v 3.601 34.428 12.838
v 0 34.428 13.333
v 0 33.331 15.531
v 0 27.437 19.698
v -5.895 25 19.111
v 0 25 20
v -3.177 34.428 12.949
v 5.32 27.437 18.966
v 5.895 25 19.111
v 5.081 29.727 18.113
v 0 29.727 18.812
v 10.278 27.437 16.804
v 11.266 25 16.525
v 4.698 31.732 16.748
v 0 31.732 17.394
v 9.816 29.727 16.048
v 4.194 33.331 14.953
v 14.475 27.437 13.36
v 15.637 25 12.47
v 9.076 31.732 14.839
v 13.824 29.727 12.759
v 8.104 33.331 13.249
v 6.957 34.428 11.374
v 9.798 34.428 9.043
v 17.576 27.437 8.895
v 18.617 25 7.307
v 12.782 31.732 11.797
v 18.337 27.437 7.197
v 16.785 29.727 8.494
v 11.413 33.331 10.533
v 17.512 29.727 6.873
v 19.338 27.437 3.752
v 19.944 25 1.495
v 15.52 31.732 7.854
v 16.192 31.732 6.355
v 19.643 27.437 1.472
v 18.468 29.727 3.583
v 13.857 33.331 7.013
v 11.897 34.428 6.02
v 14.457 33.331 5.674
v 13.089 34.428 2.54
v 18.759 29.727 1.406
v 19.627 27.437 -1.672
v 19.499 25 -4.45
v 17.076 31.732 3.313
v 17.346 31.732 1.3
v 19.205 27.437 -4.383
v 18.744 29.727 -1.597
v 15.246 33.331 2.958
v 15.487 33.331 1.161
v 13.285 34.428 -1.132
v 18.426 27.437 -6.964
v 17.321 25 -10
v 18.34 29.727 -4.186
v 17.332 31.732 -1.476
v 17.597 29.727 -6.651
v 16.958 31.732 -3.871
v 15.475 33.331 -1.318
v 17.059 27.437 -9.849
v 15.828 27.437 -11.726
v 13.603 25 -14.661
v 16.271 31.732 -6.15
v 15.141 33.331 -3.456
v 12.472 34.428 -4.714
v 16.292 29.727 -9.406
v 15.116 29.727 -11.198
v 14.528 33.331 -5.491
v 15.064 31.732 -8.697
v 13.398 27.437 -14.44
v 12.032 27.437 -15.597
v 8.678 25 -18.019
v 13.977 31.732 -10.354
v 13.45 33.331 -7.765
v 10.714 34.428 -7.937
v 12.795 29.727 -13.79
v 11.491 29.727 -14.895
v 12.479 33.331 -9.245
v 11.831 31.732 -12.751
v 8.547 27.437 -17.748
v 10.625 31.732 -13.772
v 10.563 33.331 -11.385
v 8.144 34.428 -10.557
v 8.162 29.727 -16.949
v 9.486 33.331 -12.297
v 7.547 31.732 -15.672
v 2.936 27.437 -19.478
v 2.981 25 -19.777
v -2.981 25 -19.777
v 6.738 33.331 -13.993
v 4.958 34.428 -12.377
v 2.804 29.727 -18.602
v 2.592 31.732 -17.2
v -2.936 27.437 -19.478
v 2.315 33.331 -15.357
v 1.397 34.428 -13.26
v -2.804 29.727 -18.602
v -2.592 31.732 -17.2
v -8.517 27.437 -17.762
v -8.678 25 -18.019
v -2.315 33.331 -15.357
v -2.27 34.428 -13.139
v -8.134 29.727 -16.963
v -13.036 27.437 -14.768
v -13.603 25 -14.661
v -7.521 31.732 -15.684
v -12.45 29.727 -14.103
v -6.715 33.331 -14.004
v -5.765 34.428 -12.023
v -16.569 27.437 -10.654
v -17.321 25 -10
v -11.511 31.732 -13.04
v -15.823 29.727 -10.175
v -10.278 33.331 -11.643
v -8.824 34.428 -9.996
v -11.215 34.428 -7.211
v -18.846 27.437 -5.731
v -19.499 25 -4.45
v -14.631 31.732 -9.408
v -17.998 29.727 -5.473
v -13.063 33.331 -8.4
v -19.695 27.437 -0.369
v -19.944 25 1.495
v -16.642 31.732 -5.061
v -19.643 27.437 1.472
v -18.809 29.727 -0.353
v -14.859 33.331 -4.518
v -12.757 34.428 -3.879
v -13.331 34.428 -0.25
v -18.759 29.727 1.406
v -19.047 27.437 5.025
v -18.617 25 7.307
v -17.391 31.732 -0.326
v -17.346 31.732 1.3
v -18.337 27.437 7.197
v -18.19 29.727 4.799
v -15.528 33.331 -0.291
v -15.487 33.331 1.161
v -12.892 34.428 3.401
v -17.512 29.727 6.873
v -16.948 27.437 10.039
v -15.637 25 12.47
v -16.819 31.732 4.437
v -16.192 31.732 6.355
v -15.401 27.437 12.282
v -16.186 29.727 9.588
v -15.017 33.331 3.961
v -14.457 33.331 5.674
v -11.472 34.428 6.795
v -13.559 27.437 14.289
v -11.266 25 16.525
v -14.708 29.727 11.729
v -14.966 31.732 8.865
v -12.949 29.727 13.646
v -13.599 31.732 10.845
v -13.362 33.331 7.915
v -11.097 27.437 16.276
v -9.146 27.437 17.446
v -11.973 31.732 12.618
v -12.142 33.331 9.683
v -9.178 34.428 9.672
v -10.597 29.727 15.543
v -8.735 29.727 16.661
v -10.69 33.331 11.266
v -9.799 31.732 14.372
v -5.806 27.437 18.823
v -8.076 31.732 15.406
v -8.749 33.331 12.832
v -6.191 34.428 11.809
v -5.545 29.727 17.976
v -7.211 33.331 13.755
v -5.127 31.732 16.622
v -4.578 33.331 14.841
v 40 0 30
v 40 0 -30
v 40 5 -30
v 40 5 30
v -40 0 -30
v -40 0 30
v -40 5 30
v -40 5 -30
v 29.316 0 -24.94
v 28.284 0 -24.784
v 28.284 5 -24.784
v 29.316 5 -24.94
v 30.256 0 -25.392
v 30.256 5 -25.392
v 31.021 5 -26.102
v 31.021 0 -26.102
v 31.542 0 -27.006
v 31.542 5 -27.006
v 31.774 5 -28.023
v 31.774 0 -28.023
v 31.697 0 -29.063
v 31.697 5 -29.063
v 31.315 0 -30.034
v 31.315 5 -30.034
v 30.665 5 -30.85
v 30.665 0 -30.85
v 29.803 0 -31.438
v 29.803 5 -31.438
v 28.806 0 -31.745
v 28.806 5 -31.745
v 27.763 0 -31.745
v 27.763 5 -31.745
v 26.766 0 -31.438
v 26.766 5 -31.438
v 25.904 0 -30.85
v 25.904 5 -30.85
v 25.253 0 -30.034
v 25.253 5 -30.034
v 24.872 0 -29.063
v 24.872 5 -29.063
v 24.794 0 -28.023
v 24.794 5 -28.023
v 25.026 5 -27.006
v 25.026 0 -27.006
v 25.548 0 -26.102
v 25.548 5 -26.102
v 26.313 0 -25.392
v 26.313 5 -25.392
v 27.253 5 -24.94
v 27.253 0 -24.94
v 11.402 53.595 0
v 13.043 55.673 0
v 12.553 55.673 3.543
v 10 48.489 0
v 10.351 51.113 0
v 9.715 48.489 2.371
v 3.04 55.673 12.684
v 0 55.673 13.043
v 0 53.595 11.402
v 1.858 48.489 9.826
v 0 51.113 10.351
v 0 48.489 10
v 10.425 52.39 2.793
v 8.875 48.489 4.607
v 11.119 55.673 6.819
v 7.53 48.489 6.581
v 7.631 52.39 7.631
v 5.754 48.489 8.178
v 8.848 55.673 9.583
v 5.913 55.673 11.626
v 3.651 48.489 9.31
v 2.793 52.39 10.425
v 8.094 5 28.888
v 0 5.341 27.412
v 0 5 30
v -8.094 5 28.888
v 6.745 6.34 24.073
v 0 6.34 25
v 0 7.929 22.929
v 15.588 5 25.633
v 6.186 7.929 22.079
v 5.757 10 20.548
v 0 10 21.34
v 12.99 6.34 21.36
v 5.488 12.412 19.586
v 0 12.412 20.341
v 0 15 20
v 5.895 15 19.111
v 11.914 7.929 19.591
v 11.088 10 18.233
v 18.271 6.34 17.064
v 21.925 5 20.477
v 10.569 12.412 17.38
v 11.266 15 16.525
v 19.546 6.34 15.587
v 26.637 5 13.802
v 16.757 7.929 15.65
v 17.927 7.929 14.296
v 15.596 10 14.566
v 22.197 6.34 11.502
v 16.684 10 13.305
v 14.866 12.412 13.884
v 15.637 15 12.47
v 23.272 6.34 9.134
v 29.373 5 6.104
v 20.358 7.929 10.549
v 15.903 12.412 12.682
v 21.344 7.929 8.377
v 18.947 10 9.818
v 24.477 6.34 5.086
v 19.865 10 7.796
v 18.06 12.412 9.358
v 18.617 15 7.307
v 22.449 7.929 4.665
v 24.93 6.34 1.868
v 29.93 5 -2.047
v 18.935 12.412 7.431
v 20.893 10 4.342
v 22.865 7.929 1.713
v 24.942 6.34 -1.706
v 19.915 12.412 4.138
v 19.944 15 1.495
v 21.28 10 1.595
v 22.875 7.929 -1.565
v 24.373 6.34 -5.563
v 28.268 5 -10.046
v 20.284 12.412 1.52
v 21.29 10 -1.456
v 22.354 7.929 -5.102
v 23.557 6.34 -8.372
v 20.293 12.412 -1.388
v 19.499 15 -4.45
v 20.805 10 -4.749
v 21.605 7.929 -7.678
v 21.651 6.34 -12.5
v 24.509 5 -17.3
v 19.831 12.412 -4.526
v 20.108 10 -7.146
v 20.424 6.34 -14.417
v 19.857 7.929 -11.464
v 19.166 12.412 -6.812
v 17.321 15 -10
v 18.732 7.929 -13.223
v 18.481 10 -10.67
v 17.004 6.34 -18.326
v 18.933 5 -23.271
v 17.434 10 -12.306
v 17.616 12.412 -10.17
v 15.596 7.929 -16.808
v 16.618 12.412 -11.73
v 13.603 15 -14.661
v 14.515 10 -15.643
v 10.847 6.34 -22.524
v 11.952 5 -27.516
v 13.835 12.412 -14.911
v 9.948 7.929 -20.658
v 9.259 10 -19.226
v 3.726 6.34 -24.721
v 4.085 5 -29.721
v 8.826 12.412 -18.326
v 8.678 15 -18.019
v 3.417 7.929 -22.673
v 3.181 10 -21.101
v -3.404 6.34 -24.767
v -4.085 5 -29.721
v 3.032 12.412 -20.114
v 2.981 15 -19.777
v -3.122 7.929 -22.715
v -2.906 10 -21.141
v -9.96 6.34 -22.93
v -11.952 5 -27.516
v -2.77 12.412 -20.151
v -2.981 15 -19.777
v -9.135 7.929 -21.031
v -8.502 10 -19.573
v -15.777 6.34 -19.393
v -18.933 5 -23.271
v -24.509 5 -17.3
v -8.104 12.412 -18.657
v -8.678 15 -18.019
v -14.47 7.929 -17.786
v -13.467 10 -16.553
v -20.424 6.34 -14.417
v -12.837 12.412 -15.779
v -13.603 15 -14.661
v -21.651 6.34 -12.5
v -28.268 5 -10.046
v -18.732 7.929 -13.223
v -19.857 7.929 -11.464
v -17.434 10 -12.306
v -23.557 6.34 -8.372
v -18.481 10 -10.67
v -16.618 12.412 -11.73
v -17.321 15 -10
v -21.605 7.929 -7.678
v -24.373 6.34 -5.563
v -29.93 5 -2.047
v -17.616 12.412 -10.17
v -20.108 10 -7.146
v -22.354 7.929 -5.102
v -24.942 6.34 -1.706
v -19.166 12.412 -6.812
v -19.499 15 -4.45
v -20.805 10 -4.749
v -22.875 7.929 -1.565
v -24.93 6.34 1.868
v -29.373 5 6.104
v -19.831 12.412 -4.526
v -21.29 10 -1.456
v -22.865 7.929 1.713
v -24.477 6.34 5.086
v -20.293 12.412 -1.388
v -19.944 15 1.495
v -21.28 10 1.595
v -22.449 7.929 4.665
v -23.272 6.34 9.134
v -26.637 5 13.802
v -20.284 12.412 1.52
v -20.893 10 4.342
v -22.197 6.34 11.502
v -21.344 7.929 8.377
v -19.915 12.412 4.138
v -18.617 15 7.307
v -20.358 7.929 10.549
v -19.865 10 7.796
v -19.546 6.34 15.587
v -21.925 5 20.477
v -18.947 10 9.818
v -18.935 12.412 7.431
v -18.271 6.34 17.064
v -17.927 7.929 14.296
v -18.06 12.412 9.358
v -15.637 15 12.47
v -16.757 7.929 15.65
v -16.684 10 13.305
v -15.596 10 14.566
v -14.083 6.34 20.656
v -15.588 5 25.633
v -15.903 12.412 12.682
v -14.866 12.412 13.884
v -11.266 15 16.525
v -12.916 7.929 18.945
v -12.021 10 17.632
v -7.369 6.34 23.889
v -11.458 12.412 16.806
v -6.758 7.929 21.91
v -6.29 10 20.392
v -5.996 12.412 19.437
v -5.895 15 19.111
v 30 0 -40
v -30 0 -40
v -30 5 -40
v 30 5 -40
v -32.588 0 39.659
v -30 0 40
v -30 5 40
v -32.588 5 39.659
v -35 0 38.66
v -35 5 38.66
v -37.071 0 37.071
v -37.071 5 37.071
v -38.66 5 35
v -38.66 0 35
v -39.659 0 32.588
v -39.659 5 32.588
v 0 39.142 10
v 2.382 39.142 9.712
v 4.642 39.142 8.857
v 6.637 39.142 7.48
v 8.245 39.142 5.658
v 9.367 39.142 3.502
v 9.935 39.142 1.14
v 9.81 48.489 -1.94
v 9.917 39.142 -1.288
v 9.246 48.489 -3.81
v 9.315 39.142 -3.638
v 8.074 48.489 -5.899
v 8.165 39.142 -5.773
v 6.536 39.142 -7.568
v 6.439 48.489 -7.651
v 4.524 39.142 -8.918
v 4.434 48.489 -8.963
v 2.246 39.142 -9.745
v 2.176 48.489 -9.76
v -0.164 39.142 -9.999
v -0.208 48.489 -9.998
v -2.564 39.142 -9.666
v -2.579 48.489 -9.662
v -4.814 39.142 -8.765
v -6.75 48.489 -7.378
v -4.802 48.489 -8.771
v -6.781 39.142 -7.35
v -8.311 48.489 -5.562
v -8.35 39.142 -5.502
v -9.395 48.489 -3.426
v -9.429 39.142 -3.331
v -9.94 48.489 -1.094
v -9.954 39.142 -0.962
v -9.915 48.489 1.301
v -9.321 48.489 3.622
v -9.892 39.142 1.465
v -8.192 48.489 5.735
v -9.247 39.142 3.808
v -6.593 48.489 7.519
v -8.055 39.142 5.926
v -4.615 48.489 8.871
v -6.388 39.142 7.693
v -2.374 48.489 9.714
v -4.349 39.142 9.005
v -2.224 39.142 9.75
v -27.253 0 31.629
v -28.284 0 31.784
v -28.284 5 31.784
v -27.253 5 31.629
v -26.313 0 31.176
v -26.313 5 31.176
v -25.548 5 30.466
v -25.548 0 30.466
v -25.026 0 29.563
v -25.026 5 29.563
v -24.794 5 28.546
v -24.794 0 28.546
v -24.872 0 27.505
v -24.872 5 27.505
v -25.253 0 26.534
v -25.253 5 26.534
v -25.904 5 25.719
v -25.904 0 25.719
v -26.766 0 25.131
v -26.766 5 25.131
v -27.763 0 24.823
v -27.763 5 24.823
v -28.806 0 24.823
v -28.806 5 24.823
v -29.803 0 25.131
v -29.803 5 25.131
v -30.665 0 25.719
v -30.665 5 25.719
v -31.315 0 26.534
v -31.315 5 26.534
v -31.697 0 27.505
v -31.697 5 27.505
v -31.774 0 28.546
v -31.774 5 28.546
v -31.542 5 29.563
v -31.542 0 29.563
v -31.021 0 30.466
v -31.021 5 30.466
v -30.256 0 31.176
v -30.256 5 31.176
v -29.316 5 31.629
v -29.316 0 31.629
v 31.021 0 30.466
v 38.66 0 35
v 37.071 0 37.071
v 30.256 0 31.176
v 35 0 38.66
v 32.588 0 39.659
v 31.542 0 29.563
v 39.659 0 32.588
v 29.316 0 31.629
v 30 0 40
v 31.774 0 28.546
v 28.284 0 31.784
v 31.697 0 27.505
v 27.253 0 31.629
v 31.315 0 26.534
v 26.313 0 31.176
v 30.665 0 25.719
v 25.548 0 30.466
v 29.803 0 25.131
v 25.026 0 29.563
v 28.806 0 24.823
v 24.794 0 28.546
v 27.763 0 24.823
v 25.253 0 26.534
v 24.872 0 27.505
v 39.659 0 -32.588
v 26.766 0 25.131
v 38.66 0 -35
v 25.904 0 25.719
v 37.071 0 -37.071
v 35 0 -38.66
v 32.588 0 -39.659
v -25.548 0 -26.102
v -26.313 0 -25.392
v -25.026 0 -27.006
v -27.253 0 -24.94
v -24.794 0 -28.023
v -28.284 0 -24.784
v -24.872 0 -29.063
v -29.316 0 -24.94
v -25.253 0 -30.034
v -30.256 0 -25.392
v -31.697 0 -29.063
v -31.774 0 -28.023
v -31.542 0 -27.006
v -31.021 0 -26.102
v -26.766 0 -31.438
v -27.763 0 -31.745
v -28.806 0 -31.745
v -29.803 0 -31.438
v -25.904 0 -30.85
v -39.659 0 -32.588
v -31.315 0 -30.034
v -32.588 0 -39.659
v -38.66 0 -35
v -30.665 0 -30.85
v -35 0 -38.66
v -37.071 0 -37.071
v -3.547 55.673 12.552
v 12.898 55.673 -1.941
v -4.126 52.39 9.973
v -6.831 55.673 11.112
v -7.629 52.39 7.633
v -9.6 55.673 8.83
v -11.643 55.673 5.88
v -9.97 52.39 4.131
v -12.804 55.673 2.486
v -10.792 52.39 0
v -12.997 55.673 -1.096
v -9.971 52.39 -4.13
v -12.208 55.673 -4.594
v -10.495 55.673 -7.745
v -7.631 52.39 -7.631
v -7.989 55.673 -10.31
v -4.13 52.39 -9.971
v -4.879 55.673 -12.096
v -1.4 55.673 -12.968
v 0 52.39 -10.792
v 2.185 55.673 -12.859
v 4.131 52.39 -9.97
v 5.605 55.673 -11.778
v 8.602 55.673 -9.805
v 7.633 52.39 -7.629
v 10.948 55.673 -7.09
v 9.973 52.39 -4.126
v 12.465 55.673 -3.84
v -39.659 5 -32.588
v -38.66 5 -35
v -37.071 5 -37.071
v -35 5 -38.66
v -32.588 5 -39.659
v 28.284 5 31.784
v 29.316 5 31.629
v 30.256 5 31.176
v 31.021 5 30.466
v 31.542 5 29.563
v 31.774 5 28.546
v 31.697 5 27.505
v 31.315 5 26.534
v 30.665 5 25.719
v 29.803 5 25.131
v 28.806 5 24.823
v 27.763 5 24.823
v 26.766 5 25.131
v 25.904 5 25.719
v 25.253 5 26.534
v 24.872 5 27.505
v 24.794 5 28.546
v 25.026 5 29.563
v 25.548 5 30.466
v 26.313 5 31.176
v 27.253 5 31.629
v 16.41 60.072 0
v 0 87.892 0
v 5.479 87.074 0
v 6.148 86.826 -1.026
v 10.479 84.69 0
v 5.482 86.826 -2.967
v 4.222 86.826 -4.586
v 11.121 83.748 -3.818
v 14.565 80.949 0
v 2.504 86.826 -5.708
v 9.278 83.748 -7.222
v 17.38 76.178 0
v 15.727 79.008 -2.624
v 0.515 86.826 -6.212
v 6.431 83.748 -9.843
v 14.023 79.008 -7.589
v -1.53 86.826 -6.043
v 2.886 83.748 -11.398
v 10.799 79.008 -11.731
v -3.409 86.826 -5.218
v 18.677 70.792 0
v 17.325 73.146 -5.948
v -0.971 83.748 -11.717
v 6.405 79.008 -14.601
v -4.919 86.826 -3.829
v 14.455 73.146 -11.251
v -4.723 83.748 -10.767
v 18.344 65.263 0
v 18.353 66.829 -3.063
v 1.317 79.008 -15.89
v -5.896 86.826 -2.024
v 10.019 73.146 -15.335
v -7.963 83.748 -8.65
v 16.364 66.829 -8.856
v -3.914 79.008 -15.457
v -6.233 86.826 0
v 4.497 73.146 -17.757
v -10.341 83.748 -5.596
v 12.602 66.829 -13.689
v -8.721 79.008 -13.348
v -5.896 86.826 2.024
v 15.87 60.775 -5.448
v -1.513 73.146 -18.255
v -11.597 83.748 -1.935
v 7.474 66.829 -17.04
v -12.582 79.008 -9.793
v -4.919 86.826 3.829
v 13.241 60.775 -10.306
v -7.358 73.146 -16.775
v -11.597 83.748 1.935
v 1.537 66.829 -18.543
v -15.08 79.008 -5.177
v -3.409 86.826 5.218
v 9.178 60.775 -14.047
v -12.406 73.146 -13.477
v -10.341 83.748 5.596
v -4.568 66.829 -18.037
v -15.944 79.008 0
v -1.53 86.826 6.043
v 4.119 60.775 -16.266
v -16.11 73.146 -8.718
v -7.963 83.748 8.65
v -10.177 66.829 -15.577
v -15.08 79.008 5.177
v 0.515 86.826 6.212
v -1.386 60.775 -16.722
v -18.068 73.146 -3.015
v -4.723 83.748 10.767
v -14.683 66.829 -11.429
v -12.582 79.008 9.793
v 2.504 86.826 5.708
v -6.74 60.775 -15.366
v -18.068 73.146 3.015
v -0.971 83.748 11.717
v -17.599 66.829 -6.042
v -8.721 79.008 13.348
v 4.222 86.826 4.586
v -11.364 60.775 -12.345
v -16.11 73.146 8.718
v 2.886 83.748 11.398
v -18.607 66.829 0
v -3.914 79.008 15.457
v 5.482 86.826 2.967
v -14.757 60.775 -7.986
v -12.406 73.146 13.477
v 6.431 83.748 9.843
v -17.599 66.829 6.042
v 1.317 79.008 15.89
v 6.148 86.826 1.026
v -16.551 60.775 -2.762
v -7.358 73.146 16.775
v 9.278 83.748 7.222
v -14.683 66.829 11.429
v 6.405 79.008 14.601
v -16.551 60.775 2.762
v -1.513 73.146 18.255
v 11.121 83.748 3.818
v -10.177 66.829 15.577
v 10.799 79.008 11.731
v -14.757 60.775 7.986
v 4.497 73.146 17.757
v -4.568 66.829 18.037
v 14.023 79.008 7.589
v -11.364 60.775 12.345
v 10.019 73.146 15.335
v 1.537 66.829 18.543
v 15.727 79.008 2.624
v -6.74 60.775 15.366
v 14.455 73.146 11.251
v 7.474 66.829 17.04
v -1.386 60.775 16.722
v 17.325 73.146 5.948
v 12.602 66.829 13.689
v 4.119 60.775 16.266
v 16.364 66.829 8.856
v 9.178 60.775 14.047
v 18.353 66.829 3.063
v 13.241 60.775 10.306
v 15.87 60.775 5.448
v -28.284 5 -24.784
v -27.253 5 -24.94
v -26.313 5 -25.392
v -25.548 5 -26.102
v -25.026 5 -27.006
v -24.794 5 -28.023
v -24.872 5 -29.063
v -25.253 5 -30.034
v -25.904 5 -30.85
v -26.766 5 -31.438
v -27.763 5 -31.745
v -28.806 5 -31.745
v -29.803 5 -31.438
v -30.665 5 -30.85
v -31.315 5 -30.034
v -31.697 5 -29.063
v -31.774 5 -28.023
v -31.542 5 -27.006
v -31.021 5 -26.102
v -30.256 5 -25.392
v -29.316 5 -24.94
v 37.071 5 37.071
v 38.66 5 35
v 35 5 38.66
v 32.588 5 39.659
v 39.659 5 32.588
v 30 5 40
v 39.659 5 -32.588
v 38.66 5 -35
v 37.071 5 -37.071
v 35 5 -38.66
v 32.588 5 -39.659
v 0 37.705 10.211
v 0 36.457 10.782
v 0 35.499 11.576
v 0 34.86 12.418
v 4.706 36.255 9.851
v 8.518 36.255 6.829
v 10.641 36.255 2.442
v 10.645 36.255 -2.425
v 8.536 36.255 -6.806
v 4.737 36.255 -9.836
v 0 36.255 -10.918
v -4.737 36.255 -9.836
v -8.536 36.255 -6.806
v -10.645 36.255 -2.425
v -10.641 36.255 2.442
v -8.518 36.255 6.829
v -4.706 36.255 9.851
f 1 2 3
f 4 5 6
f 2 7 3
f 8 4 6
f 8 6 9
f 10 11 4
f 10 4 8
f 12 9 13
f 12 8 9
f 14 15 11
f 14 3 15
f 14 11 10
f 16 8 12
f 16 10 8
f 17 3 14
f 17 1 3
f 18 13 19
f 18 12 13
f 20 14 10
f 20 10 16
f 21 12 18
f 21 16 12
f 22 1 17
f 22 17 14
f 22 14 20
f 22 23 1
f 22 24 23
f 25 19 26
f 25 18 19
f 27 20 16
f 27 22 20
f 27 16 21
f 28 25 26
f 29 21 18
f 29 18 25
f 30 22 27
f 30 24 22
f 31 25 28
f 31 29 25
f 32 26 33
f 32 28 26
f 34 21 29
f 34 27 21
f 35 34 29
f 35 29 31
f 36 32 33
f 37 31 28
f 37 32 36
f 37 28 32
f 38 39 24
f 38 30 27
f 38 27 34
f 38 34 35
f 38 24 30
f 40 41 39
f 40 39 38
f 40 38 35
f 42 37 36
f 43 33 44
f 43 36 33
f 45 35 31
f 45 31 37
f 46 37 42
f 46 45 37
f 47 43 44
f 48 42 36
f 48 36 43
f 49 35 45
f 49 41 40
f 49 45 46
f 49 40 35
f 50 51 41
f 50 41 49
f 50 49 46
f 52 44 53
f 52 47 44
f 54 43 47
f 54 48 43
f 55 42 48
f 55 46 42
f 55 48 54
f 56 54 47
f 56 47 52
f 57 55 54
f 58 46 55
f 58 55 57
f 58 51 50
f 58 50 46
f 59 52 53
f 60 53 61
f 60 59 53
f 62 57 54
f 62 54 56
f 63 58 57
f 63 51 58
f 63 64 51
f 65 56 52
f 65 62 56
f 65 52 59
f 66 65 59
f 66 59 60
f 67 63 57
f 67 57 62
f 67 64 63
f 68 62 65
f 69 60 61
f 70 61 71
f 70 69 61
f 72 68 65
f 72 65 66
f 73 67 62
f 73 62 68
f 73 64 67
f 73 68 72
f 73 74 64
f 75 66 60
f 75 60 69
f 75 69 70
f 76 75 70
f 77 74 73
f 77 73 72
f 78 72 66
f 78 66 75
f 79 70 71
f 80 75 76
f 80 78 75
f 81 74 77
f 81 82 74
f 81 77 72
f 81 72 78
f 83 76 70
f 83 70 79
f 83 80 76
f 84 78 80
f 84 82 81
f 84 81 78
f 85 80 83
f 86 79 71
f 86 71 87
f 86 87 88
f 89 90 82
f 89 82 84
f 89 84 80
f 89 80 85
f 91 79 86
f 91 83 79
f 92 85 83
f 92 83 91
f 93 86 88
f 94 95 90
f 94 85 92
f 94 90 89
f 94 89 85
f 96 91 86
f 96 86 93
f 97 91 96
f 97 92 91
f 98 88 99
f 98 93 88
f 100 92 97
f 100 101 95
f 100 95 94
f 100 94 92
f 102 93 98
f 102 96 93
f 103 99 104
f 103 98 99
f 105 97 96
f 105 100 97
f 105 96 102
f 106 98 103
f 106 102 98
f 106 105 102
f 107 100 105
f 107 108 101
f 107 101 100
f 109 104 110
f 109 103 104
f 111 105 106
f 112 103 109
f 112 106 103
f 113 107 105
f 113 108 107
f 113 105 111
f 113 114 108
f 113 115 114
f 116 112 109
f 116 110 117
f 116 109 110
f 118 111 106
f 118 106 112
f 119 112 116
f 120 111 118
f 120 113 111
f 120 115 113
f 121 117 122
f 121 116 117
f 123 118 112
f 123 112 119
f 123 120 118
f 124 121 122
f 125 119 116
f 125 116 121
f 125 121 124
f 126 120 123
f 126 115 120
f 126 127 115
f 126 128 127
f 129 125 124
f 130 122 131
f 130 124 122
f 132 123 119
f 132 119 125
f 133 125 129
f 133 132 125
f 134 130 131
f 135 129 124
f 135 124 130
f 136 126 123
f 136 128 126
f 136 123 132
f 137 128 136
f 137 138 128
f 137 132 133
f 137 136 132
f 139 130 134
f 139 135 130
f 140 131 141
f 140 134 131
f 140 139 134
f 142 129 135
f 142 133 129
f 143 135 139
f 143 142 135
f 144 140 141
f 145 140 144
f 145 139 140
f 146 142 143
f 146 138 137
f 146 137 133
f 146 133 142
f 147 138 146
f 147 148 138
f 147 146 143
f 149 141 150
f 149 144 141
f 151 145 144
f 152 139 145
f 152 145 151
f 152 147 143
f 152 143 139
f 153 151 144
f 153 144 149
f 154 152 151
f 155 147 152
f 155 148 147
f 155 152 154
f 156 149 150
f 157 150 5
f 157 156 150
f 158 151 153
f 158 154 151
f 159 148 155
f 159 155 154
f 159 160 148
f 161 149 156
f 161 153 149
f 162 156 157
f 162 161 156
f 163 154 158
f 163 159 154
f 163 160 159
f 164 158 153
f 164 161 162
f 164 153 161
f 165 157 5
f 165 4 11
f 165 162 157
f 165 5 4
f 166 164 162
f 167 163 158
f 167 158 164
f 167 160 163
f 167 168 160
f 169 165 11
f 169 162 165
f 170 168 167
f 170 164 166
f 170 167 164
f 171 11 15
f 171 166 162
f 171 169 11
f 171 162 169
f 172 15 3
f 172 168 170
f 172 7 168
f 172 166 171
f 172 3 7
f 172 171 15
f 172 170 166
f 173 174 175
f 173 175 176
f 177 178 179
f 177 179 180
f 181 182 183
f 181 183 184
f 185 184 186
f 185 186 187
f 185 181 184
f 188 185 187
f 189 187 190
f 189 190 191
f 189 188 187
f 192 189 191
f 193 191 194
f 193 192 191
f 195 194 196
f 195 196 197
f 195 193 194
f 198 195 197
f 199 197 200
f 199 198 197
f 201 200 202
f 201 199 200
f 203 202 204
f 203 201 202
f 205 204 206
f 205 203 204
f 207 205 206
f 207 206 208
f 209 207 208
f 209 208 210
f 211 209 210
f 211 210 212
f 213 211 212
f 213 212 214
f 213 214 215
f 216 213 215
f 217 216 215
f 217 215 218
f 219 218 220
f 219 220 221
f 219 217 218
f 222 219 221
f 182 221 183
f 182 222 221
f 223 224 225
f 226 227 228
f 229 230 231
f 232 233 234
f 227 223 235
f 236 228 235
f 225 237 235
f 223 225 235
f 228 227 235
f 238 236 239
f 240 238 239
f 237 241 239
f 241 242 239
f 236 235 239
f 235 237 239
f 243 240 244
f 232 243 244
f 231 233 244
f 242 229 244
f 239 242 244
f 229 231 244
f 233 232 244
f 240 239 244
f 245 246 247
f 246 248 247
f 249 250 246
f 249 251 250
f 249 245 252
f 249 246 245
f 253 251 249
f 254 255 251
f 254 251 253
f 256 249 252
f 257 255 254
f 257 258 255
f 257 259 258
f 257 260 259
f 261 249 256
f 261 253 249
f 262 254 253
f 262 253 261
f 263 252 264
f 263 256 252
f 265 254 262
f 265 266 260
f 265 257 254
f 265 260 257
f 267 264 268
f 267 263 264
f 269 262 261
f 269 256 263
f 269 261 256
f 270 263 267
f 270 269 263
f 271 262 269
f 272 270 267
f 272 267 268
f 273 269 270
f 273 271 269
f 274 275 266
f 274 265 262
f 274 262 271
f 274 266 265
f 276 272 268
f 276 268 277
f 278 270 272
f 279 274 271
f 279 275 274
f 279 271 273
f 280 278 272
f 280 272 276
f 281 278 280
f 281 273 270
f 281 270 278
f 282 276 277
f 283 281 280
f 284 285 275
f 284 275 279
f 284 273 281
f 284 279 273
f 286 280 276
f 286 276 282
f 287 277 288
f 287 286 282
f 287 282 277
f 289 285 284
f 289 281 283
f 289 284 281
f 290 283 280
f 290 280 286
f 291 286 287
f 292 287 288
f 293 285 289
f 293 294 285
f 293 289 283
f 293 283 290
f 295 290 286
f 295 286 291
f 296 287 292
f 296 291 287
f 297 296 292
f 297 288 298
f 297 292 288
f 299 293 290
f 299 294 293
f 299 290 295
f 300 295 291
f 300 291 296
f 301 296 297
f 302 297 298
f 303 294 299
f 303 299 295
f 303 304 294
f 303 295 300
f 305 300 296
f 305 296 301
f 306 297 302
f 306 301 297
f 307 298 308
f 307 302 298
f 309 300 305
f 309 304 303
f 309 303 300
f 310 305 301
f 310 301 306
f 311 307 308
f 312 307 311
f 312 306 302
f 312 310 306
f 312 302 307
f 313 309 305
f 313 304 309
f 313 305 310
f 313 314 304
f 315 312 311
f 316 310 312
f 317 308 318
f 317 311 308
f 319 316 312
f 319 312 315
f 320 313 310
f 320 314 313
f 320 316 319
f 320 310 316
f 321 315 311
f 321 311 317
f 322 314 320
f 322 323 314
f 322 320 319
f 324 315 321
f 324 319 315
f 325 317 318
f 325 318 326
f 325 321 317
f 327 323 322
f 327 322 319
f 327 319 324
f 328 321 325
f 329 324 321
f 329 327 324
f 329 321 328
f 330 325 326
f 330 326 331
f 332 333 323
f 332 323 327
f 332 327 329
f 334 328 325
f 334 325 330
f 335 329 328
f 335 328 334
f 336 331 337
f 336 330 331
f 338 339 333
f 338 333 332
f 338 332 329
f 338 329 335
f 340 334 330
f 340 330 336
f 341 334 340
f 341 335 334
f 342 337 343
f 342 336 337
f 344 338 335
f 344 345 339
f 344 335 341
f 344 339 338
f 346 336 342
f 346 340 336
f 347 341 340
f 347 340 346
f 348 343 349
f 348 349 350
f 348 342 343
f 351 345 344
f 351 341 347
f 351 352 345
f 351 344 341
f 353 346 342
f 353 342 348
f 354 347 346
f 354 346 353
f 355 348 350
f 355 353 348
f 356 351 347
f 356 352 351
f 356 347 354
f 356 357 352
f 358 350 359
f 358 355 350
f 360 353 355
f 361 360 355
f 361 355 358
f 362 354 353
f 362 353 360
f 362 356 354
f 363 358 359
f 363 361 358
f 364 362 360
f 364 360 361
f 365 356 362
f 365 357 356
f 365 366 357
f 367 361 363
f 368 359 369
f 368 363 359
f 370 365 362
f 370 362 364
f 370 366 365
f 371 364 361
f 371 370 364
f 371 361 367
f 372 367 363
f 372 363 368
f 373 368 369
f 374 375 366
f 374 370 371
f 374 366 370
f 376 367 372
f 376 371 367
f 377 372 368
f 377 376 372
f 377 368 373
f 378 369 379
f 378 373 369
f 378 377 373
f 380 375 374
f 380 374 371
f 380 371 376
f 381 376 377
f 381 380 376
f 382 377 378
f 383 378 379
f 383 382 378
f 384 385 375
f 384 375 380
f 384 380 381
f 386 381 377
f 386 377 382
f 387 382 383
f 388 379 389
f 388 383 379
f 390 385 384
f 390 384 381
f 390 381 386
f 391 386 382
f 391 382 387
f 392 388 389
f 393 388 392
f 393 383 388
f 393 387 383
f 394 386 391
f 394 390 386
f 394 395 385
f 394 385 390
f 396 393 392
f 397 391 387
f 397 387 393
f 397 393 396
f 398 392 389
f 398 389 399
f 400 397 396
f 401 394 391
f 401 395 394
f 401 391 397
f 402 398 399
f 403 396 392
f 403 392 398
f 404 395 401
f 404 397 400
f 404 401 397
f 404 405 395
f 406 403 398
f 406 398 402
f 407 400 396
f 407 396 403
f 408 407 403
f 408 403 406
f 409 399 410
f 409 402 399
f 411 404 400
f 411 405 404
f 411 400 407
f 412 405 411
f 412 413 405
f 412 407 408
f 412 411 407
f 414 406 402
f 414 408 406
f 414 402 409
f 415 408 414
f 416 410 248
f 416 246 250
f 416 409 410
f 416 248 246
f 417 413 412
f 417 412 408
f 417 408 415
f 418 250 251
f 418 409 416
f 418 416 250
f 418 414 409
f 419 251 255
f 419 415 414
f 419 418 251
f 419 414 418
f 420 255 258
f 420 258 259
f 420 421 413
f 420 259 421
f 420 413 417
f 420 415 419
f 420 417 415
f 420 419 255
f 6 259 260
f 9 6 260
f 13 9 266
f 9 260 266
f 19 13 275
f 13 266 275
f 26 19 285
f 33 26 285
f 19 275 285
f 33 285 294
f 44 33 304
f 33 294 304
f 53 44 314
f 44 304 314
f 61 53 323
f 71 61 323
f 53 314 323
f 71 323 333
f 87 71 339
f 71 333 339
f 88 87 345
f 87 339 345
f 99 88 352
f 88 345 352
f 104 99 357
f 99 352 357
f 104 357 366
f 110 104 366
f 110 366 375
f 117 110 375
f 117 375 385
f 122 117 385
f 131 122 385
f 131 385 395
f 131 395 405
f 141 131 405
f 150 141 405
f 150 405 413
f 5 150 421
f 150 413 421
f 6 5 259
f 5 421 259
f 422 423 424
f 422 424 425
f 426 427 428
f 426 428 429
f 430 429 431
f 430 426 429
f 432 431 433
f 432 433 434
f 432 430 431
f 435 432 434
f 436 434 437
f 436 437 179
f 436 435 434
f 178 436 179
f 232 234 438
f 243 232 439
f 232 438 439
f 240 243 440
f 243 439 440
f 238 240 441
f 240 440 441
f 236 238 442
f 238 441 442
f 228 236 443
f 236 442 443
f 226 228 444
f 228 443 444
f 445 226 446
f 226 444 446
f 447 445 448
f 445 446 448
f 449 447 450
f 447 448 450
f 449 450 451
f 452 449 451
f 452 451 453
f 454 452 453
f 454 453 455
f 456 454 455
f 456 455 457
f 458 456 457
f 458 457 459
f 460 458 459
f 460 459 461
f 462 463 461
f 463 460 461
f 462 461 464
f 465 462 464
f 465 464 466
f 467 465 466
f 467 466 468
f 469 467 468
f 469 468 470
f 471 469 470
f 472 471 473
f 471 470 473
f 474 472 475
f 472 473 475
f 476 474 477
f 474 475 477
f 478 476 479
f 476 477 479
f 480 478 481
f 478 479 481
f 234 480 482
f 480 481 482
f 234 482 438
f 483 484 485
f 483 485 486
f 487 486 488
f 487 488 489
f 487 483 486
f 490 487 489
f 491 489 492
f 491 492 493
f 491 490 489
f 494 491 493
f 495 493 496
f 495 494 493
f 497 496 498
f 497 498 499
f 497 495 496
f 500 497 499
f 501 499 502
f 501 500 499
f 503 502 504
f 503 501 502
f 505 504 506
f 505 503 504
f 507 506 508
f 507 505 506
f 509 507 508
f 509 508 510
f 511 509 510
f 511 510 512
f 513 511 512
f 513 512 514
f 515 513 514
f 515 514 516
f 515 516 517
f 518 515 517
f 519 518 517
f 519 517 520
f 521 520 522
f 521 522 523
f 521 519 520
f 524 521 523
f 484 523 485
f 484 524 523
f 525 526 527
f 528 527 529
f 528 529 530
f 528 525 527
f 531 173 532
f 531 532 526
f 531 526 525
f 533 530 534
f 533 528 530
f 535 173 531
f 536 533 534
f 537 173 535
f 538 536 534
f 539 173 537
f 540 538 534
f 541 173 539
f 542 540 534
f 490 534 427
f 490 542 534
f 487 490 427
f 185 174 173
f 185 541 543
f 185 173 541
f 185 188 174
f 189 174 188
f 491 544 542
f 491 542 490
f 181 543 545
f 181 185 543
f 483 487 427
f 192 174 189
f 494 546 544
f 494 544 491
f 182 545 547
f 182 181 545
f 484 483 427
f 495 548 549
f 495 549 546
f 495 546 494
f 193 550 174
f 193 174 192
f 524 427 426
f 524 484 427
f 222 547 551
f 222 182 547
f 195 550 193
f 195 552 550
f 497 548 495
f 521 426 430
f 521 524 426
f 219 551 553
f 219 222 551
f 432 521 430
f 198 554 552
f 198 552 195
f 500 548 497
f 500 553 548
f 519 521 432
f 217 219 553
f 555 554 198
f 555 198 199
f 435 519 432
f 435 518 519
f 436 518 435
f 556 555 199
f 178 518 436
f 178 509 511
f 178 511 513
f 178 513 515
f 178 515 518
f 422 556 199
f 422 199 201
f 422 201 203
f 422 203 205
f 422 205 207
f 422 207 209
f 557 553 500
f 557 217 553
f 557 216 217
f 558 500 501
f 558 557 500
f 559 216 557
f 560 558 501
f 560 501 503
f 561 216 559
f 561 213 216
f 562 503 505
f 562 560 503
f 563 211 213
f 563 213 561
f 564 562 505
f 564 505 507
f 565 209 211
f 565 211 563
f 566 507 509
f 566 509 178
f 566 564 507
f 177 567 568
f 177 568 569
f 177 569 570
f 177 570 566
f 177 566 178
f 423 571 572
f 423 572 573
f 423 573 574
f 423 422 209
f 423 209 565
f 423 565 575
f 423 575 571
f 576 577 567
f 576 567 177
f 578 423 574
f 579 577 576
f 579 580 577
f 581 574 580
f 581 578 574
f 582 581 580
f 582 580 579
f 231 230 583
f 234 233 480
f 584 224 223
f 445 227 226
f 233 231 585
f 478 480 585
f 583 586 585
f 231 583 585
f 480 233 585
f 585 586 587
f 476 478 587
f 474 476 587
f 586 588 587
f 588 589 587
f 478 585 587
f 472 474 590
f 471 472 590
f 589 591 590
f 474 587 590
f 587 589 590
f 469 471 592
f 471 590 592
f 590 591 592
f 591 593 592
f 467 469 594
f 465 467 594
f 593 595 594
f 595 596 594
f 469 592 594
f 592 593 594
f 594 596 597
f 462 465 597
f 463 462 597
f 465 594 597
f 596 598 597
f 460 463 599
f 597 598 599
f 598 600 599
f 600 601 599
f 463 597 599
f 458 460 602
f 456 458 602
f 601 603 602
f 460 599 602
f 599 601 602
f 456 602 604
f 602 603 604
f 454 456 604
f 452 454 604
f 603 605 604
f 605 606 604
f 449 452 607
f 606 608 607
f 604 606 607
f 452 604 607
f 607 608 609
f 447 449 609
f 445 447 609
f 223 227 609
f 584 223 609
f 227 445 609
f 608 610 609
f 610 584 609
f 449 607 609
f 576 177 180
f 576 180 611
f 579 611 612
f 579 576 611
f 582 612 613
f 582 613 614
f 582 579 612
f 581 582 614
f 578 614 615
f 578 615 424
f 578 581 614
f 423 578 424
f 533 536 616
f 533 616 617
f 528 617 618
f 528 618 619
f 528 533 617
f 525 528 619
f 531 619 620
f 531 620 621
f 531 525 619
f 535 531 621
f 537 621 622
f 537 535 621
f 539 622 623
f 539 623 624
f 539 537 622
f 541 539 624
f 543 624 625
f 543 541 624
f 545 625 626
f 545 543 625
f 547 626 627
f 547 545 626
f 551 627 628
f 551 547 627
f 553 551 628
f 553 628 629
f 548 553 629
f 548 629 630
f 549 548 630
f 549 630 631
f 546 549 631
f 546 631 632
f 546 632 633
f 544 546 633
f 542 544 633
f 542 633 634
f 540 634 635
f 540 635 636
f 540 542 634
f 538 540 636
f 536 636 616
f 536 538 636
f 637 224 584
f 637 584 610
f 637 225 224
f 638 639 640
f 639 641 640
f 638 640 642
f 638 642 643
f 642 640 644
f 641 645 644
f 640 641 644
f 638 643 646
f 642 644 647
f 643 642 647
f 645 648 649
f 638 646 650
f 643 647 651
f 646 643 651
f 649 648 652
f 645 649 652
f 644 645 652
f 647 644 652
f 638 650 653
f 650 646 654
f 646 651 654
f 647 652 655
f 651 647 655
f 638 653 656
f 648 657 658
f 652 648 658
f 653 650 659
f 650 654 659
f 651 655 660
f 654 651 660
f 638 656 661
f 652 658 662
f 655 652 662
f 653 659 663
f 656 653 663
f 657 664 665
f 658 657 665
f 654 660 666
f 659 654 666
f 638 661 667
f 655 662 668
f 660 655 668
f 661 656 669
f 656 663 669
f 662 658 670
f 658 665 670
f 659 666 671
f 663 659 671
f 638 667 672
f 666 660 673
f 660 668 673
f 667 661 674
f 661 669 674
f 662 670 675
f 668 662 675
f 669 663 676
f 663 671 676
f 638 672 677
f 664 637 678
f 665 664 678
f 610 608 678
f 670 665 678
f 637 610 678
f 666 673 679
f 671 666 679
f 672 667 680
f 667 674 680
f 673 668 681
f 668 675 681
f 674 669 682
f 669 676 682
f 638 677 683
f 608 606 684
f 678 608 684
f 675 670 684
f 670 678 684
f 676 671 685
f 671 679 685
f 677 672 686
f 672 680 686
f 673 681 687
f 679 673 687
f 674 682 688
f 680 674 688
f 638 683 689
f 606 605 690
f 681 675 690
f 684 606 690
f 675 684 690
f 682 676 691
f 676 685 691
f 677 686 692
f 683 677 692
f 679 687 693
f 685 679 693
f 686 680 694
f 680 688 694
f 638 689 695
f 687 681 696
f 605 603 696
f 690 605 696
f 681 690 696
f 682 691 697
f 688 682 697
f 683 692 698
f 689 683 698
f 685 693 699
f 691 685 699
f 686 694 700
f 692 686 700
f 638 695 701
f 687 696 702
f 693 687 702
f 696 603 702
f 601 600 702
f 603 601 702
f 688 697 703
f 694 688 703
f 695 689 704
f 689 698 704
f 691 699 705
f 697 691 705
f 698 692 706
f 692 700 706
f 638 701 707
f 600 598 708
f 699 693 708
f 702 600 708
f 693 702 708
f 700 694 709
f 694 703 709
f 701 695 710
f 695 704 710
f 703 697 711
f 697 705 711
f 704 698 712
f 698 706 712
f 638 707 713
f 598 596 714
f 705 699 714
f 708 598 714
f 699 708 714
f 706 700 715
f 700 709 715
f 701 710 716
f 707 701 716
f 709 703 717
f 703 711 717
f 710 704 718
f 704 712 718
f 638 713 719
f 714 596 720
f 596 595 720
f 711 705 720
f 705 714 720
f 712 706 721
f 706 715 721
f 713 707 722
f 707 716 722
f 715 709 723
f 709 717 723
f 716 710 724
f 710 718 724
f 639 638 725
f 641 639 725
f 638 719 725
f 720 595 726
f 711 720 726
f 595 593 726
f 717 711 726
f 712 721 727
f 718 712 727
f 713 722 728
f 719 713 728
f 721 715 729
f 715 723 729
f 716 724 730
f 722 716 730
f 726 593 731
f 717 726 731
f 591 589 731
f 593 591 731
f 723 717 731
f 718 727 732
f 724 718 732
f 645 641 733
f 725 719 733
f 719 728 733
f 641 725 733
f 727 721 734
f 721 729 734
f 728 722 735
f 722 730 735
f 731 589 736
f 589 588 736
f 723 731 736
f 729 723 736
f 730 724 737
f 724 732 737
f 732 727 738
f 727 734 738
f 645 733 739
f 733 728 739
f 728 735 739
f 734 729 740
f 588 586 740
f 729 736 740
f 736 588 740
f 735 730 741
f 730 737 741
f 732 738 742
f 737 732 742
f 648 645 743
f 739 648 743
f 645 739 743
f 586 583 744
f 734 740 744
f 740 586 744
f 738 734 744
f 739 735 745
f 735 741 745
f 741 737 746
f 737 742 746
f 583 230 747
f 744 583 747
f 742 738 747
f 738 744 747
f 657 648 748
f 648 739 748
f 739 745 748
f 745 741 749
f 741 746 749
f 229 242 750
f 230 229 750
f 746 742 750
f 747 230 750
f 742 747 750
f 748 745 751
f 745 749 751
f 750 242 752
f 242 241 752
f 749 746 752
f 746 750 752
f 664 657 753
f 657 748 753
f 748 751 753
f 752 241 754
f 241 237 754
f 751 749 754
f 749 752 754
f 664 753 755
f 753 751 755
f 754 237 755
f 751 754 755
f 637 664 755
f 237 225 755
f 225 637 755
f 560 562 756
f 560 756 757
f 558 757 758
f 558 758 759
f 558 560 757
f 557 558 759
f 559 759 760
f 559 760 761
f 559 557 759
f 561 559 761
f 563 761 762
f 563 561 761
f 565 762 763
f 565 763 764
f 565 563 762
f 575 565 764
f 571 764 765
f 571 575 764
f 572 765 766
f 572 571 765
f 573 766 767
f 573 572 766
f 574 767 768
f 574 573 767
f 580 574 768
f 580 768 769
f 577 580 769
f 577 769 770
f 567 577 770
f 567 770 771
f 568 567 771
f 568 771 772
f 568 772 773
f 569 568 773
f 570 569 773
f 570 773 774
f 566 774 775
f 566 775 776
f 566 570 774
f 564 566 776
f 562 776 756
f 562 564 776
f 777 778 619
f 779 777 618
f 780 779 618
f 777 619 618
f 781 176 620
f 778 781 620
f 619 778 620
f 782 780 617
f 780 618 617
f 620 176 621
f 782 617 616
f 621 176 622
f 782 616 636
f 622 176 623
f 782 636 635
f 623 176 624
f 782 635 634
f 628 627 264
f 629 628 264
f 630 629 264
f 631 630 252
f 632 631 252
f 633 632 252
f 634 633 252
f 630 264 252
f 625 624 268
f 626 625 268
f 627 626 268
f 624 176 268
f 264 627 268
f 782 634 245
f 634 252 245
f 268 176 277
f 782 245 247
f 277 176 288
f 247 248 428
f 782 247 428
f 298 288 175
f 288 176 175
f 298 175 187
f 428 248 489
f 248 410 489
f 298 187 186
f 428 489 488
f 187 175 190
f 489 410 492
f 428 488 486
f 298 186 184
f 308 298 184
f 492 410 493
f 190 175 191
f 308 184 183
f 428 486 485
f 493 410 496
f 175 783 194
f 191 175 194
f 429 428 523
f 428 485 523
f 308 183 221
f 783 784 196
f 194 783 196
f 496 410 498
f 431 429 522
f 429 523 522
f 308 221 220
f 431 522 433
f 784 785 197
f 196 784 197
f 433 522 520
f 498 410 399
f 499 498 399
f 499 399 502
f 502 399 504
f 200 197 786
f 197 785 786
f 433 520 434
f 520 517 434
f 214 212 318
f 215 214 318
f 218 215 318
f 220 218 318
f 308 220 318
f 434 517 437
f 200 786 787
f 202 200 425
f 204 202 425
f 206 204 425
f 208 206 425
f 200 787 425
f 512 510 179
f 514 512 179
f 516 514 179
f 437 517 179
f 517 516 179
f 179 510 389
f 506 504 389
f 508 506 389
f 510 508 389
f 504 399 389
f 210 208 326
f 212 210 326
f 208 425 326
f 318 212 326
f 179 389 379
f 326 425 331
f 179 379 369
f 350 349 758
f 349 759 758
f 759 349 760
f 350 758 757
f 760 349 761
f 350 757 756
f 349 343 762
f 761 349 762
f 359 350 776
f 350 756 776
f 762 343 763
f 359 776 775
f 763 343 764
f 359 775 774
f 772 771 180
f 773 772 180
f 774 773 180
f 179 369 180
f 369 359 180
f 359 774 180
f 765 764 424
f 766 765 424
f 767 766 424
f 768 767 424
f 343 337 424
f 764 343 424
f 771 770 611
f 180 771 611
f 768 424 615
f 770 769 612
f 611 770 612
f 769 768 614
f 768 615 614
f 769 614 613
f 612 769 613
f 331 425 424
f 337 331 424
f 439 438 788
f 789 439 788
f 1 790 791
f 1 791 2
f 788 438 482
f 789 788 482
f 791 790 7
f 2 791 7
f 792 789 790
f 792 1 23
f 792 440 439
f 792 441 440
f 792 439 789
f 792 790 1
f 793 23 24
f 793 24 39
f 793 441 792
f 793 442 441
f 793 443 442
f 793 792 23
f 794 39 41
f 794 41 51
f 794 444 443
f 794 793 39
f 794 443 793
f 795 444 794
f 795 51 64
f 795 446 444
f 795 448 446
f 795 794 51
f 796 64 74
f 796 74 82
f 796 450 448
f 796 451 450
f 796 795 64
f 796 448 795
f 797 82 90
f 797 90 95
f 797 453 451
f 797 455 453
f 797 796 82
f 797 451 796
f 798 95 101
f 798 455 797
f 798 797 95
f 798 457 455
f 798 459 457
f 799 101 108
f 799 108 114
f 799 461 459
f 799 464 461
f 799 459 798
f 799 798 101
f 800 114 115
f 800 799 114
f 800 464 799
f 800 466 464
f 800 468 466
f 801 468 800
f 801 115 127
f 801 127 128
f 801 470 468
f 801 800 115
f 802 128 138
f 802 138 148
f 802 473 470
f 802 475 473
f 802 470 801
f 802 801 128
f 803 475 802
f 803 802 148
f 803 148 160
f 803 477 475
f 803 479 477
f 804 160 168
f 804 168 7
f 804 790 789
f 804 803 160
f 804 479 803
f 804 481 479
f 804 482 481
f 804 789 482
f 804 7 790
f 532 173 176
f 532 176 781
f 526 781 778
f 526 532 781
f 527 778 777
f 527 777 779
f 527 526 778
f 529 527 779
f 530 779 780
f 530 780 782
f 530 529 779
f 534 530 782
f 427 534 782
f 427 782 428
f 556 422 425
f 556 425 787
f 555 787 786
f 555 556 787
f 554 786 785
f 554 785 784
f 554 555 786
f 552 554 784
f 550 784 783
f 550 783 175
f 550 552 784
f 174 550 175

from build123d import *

# Parameters (mm, degrees)
SKETCH1_R           = 3.5
BOSS_EXTRUDE1_DEPTH = 5
SKETCH2_R           = 20
BOSS_EXTRUDE2_DEPTH = 30
FILLET1_R           = 10
SKETCH3_R           = 10
BOSS_EXTRUDE3_DEPTH = 20
FILLET2_R           = 5
FILLET3_R           = 10


with BuildPart() as part:
    # Sketch1 → Boss-Extrude1 (new body)
    with BuildSketch(Plane(origin=(0, 0, 0), x_dir=(1, 0, 0), z_dir=(0, 1, 0))):
        with BuildLine():
            Line((-30, 40), (30, 40))
            ThreePointArc((30, 40), (37.071067812, 37.071067812), (40, 30))
            Line((40, 30), (40, -30))
            ThreePointArc((40, -30), (37.071067812, -37.071067812), (30, -40))
            Line((30, -40), (-30, -40))
            ThreePointArc((-30, -40), (-37.071067812, -37.071067812), (-40, -30))
            Line((-40, -30), (-40, 30))
            ThreePointArc((-40, 30), (-37.071067812, 37.071067812), (-30, 40))
        make_face()
        with Locations(Location((-28.284271247, 28.284271247, 0), (0, 0, 270))):
            Circle(SKETCH1_R, mode=Mode.SUBTRACT)
        with Locations(Location((28.284271247, 28.284271247, 0), (0, 0, 270))):
            Circle(SKETCH1_R, mode=Mode.SUBTRACT)
        with Locations(Location((28.284271247, -28.284271247, 0), (0, 0, 270))):
            Circle(SKETCH1_R, mode=Mode.SUBTRACT)
        with Locations(Location((-28.284271247, -28.284271247, 0), (0, 0, 270))):
            Circle(SKETCH1_R, mode=Mode.SUBTRACT)
    extrude(amount=BOSS_EXTRUDE1_DEPTH)

    # Sketch2 → Boss-Extrude2 (add)
    with BuildSketch(Plane(origin=(0, 5, 0), x_dir=(1, 0, 0), z_dir=(0, 1, 0))):
        with Locations(Location((0, 0, 0), (0, 0, 270))):
            Circle(SKETCH2_R)
    extrude(amount=BOSS_EXTRUDE2_DEPTH)

    # Fillet1
    fillet1_edges = [part.edges().sort_by_distance(p)[0] for p in [
        (0, 5, -20),
        (0, 35, -20),
    ]]
    fillet(fillet1_edges, radius=FILLET1_R)

    # Sketch3 → Boss-Extrude3 (add)
    with BuildSketch(Plane(origin=(0, 35, 0), x_dir=(1, 0, 0), z_dir=(0, 1, 0))):
        with Locations(Location((0, 0, 0), (0, 0, 270))):
            Circle(SKETCH3_R)
    extrude(amount=BOSS_EXTRUDE3_DEPTH)

    # Fillet2
    fillet2_edges = [part.edges().sort_by_distance(p)[0] for p in [
        (0, 35, -10),
    ]]
    fillet(fillet2_edges, radius=FILLET2_R)

    # Sketch4 → Revolve1 (revolve)
    with BuildSketch(Plane.XY):
        with BuildLine():
            Line((0, 50.392135624), (0, 87.892135624))
            ThreePointArc((0, 87.892135624), (18.75, 69.142135624), (0, 50.392135624))
        make_face()
    revolve(axis=Axis((0, 55, 0), (0, 1, 0)))

    # Fillet3
    fillet3_edges = [part.edges().sort_by_distance(p)[0] for p in [
        (-7.071067812, 53.281413698, -7.071067812),
    ]]
    fillet(fillet3_edges, radius=FILLET3_R)


solid = part.part
